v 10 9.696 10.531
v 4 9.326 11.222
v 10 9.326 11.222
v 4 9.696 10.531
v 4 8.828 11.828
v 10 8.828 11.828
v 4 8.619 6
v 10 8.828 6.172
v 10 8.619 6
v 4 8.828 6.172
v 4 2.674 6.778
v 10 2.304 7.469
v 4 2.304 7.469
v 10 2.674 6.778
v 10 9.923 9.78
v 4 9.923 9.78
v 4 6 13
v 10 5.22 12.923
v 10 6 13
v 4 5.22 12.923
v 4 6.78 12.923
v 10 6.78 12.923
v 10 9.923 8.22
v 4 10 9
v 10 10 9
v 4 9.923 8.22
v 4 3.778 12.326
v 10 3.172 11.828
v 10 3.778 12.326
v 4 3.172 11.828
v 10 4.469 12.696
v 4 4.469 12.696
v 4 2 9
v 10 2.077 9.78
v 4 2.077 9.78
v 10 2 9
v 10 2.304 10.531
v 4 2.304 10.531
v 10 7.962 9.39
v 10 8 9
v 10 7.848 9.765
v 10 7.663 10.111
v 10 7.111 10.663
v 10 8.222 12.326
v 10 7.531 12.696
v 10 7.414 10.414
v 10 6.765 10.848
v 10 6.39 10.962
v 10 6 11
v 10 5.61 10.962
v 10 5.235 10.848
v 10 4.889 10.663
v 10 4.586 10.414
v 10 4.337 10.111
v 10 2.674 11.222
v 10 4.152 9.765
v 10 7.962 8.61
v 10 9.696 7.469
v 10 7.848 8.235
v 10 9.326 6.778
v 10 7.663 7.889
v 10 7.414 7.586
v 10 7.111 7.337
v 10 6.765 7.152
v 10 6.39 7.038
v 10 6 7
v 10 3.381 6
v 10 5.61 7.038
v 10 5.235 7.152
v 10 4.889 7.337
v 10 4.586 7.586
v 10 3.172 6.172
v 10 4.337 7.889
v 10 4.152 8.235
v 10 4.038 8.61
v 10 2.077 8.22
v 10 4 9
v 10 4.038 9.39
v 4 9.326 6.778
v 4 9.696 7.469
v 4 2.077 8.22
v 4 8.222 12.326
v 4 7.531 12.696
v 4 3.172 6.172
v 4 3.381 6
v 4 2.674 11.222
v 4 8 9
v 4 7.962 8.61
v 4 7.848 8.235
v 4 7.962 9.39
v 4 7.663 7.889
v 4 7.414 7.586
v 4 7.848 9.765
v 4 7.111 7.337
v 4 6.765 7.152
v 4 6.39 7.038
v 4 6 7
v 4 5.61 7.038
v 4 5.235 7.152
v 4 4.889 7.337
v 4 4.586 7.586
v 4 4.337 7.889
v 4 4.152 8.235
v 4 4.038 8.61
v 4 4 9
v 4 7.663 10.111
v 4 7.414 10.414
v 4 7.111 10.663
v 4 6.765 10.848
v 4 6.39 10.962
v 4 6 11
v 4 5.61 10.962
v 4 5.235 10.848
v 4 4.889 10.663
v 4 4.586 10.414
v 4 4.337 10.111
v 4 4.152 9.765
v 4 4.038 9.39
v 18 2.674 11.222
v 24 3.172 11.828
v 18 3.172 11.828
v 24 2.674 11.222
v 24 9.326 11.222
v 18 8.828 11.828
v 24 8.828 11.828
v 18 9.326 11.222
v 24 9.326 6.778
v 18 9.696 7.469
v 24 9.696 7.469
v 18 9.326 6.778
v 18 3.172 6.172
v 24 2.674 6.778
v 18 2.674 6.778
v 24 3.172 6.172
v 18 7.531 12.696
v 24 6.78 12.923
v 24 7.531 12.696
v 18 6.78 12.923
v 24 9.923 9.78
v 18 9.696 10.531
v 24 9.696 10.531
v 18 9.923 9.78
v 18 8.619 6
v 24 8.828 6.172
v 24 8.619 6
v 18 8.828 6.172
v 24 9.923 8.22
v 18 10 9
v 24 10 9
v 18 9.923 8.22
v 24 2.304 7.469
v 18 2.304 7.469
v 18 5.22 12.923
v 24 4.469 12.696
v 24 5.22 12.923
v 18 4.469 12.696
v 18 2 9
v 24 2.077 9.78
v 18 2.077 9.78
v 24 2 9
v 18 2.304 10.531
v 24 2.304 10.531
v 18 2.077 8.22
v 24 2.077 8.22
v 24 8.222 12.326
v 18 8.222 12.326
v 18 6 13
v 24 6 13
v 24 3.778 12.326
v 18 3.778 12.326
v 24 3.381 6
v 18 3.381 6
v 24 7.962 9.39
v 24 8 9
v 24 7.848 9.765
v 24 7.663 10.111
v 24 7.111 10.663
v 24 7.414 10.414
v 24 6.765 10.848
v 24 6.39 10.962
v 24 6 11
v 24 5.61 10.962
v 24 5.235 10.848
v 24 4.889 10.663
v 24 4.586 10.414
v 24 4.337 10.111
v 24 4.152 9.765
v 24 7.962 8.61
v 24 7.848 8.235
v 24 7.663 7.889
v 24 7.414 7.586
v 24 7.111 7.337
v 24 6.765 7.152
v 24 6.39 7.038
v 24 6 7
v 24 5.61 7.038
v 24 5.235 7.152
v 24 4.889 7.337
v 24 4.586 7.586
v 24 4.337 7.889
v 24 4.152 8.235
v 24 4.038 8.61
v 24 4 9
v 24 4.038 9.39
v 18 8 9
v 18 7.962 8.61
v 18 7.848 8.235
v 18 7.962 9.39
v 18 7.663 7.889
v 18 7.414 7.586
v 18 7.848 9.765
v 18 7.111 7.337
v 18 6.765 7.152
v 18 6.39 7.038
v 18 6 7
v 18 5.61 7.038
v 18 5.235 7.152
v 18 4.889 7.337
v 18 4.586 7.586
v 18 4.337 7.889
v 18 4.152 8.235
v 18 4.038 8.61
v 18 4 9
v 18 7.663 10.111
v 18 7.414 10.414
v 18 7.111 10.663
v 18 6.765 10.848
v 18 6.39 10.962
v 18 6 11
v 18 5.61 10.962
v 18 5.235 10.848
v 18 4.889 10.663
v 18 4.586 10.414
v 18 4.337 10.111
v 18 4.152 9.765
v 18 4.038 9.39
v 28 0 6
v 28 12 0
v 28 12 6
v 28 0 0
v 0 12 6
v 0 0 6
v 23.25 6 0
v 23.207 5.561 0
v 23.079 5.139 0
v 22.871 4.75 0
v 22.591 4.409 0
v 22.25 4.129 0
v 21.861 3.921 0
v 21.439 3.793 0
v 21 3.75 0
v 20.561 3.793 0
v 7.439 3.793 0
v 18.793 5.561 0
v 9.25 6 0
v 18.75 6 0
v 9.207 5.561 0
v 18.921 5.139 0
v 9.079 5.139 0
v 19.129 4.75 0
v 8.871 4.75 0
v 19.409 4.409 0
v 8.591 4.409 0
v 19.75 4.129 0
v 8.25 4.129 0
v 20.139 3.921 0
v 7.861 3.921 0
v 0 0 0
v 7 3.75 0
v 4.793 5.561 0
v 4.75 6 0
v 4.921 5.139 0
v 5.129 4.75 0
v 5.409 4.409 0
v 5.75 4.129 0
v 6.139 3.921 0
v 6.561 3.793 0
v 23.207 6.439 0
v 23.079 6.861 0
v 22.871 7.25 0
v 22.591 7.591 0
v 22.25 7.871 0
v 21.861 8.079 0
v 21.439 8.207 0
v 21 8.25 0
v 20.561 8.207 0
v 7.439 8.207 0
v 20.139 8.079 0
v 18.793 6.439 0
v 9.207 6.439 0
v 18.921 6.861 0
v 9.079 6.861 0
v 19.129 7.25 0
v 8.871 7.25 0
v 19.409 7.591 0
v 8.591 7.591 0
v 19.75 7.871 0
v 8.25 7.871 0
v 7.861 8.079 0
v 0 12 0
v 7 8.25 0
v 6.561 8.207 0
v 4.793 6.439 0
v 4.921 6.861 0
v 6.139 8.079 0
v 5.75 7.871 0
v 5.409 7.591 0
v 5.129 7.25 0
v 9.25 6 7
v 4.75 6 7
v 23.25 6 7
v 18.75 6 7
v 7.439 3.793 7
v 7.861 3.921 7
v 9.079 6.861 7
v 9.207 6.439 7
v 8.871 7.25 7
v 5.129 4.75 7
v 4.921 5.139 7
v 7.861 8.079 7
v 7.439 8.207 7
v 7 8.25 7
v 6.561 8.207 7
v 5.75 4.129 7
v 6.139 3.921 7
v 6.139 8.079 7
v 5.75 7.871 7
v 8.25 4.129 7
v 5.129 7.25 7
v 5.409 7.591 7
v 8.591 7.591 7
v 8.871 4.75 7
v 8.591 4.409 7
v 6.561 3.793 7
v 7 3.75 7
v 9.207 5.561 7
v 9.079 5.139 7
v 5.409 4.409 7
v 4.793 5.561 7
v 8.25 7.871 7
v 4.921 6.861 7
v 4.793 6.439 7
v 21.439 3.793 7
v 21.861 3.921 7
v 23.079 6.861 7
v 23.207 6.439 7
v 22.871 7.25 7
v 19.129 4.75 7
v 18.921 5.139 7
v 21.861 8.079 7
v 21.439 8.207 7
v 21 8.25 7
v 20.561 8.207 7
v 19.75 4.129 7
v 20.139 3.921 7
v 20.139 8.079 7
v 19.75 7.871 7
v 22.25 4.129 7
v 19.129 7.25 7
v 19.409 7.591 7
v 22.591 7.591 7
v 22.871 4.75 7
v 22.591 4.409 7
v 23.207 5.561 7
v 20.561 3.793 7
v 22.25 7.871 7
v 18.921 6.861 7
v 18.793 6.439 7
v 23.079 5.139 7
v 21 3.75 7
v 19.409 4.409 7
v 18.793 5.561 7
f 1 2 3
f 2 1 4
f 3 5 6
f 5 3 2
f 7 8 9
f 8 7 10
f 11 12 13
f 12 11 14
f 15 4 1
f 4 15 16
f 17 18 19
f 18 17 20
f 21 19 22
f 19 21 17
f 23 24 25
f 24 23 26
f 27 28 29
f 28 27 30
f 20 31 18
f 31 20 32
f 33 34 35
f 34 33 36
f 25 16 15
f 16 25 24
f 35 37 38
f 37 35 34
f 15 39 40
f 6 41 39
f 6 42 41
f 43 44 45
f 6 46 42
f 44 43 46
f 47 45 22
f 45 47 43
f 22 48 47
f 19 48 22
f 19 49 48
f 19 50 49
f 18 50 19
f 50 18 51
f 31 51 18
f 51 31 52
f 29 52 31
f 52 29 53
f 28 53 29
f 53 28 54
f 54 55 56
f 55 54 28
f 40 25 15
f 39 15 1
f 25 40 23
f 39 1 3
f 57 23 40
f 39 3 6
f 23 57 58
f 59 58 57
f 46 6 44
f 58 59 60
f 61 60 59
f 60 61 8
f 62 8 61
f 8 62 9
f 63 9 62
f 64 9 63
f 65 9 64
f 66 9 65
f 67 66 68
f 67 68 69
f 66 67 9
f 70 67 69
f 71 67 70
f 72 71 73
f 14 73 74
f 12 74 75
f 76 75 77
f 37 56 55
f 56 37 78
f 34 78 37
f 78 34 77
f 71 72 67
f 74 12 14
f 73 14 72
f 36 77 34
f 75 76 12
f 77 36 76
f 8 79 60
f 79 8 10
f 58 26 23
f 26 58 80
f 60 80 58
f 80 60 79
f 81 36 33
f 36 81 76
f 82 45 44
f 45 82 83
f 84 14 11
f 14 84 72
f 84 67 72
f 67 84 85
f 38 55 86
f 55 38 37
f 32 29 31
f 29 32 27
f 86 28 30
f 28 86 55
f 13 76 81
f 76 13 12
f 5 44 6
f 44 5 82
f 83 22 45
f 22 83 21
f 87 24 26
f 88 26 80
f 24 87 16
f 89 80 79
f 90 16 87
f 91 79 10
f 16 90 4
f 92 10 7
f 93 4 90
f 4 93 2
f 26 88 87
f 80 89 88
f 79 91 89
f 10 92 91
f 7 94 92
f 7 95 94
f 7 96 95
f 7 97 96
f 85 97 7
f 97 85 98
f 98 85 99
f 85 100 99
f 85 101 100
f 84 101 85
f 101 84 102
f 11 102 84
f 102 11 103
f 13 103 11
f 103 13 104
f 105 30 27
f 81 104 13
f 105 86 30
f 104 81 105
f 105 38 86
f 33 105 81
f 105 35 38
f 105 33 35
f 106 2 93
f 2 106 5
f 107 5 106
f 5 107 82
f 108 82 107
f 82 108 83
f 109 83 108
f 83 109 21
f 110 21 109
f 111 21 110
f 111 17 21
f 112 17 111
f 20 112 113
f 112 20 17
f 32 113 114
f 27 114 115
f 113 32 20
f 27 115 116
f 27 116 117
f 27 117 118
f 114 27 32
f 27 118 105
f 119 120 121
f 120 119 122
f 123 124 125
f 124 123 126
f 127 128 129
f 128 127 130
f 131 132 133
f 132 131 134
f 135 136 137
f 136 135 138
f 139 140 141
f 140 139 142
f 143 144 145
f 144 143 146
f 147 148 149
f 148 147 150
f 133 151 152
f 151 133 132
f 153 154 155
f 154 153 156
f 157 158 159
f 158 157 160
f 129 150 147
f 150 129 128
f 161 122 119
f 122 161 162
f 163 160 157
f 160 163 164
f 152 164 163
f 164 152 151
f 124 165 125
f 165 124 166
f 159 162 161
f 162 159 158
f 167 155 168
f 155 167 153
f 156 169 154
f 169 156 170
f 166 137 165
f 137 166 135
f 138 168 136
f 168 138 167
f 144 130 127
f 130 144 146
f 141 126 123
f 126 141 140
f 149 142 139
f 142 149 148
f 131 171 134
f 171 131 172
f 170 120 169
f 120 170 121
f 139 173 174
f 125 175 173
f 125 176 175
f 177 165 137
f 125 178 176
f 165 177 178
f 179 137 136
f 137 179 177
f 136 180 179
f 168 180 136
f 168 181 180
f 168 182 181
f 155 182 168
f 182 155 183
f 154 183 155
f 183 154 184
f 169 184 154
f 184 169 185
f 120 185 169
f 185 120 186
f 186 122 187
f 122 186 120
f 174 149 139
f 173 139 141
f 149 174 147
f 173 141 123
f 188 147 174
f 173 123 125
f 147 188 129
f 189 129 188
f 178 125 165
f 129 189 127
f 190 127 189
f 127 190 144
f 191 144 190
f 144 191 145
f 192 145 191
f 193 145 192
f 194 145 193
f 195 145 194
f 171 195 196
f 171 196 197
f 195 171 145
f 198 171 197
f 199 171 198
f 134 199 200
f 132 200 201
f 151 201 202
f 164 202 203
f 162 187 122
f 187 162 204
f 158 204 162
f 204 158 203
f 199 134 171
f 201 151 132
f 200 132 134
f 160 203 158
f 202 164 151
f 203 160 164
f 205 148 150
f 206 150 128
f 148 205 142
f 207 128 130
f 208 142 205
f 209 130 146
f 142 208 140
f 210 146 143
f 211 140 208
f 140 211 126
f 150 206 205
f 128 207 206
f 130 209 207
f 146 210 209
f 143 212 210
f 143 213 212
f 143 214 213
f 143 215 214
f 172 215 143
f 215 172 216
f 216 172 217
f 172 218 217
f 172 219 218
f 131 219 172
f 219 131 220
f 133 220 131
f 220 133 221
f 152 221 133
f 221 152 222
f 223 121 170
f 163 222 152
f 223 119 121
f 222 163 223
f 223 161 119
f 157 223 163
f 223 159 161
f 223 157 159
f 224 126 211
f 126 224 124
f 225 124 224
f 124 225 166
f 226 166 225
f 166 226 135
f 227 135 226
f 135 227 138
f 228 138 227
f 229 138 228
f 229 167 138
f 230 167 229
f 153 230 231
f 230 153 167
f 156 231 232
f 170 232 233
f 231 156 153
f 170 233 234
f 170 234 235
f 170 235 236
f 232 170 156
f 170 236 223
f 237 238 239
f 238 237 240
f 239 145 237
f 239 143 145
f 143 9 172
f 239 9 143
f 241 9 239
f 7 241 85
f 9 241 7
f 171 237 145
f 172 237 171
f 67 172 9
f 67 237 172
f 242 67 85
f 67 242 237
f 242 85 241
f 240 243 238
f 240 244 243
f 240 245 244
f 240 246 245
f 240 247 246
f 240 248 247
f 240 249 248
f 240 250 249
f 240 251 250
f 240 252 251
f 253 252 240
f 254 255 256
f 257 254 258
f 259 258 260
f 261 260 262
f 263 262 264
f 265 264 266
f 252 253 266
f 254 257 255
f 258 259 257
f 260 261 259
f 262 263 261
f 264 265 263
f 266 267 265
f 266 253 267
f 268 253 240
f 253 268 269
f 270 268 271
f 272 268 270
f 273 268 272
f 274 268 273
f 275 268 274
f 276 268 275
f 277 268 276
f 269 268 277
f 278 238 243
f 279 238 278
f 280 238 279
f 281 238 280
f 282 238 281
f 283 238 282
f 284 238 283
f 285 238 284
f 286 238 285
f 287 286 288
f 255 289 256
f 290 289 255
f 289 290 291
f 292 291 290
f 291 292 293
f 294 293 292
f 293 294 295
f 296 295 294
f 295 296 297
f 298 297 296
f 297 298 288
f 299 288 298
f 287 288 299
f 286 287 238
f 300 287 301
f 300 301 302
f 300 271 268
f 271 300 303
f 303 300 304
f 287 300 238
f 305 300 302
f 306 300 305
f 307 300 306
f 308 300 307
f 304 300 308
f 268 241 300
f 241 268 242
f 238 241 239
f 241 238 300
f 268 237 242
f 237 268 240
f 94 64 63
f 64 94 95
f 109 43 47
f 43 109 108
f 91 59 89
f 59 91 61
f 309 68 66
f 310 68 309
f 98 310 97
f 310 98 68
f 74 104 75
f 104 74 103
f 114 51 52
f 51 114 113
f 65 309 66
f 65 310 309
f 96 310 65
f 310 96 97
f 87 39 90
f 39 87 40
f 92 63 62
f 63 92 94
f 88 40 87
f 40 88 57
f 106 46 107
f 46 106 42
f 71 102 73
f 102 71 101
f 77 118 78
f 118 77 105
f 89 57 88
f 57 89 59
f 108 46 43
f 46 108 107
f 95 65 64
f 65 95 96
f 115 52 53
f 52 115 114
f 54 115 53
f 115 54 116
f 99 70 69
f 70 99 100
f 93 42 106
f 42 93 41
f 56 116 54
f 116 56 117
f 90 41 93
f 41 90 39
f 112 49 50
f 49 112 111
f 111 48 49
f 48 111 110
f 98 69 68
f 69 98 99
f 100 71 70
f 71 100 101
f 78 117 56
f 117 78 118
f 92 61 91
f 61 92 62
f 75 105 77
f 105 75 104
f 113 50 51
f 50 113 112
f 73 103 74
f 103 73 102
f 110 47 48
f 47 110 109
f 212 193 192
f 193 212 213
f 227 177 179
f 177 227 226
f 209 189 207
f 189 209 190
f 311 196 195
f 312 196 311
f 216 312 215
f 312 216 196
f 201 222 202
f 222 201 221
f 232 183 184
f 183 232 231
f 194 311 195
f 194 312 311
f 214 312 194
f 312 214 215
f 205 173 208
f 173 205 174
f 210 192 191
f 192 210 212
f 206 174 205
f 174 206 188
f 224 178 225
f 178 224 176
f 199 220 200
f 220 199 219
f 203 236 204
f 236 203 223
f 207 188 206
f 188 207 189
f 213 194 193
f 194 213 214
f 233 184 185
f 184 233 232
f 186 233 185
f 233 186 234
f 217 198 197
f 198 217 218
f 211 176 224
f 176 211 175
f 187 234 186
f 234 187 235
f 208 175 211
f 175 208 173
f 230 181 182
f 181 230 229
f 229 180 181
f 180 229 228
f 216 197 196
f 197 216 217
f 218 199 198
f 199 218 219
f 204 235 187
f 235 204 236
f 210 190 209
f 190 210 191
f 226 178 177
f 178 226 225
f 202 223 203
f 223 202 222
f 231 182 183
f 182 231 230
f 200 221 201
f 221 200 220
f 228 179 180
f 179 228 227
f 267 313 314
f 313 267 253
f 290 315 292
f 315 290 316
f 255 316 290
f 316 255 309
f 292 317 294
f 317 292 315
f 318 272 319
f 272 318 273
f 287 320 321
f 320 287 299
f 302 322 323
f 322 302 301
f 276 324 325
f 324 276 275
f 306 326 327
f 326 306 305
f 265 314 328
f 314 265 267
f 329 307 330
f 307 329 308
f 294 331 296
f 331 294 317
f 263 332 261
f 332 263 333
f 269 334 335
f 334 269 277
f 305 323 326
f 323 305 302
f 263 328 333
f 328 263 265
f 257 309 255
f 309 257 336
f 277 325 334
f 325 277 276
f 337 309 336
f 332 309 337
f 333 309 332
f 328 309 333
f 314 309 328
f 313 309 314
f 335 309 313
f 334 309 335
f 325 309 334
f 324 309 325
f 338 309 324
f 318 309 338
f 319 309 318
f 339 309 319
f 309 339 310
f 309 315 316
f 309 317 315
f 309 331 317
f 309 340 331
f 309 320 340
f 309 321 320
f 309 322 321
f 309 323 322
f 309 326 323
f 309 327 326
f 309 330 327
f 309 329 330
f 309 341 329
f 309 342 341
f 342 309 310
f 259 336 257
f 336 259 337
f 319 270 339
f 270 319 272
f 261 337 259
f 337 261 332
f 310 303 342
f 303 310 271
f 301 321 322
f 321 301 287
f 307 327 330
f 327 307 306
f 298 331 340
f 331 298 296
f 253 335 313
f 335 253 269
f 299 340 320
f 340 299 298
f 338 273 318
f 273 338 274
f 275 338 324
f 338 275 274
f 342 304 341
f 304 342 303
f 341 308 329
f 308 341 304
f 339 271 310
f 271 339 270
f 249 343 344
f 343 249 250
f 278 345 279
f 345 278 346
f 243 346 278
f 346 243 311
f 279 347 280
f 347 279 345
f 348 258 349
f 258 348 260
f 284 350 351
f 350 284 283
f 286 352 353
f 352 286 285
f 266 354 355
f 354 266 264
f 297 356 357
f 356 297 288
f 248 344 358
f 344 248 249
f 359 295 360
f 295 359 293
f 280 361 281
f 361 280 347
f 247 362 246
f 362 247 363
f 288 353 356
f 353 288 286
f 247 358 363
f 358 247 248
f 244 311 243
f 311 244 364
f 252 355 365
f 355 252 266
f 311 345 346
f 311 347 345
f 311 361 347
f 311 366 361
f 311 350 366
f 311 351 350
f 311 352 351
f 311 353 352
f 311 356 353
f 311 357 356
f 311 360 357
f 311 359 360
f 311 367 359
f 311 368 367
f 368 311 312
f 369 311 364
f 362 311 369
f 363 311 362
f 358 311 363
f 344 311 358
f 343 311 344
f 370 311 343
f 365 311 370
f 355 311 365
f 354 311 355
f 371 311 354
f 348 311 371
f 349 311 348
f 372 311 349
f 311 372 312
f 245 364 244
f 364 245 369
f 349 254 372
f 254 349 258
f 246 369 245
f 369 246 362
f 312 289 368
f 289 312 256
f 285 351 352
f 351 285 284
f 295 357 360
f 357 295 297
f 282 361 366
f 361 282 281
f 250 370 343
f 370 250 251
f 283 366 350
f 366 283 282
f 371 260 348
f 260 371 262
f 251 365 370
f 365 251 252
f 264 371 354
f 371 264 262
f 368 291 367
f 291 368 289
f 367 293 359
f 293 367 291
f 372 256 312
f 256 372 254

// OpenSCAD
$fn = 32;

// ----------------------------------------------------------------------
// Cable clip: cable 4 mm, clamp 8 mm, base 28 mm
// ----------------------------------------------------------------------

// --- parameters (mm) ---
plate_x = 28;             // base length, X
plate_y = 12;             // base width, Y
plate_t = 6;              // base thickness
wire_seat_d = 8;          // clamp outside diameter
clip_t = 2;               // clamp wall
cable_d = 4;              // cable opening
ring_w = 6;               // clamp width along the cable
screw_d = 4.5;            // screw clearance
sink = 1;                 // overlap of the clamp into the base
pitch = 14;               // distance between the two clamps

module base() {
  cube([plate_x, plate_y, plate_t]);
}

module clamps() {
  for (sx = [-1, 1])
    translate([plate_x / 2 + sx * pitch / 2, plate_y / 2, plate_t + wire_seat_d / 2 - sink]) rotate([0, 90, 0])
      cylinder(h = ring_w, d = wire_seat_d, center = true);
}

difference() {
  union() {
    base();
    clamps();
  }
  for (sx = [-1, 1])
    translate([plate_x / 2 + sx * pitch / 2, plate_y / 2, plate_t + wire_seat_d / 2 - sink]) rotate([0, 90, 0]) translate([0, 0, -ring_w / 2 - 1]) cylinder(h = ring_w + 2, d = cable_d);
  translate([7, plate_y / 2, -1]) cylinder(h = plate_t + 2, d = screw_d);
  translate([21, plate_y / 2, -1]) cylinder(h = plate_t + 2, d = screw_d);
}
